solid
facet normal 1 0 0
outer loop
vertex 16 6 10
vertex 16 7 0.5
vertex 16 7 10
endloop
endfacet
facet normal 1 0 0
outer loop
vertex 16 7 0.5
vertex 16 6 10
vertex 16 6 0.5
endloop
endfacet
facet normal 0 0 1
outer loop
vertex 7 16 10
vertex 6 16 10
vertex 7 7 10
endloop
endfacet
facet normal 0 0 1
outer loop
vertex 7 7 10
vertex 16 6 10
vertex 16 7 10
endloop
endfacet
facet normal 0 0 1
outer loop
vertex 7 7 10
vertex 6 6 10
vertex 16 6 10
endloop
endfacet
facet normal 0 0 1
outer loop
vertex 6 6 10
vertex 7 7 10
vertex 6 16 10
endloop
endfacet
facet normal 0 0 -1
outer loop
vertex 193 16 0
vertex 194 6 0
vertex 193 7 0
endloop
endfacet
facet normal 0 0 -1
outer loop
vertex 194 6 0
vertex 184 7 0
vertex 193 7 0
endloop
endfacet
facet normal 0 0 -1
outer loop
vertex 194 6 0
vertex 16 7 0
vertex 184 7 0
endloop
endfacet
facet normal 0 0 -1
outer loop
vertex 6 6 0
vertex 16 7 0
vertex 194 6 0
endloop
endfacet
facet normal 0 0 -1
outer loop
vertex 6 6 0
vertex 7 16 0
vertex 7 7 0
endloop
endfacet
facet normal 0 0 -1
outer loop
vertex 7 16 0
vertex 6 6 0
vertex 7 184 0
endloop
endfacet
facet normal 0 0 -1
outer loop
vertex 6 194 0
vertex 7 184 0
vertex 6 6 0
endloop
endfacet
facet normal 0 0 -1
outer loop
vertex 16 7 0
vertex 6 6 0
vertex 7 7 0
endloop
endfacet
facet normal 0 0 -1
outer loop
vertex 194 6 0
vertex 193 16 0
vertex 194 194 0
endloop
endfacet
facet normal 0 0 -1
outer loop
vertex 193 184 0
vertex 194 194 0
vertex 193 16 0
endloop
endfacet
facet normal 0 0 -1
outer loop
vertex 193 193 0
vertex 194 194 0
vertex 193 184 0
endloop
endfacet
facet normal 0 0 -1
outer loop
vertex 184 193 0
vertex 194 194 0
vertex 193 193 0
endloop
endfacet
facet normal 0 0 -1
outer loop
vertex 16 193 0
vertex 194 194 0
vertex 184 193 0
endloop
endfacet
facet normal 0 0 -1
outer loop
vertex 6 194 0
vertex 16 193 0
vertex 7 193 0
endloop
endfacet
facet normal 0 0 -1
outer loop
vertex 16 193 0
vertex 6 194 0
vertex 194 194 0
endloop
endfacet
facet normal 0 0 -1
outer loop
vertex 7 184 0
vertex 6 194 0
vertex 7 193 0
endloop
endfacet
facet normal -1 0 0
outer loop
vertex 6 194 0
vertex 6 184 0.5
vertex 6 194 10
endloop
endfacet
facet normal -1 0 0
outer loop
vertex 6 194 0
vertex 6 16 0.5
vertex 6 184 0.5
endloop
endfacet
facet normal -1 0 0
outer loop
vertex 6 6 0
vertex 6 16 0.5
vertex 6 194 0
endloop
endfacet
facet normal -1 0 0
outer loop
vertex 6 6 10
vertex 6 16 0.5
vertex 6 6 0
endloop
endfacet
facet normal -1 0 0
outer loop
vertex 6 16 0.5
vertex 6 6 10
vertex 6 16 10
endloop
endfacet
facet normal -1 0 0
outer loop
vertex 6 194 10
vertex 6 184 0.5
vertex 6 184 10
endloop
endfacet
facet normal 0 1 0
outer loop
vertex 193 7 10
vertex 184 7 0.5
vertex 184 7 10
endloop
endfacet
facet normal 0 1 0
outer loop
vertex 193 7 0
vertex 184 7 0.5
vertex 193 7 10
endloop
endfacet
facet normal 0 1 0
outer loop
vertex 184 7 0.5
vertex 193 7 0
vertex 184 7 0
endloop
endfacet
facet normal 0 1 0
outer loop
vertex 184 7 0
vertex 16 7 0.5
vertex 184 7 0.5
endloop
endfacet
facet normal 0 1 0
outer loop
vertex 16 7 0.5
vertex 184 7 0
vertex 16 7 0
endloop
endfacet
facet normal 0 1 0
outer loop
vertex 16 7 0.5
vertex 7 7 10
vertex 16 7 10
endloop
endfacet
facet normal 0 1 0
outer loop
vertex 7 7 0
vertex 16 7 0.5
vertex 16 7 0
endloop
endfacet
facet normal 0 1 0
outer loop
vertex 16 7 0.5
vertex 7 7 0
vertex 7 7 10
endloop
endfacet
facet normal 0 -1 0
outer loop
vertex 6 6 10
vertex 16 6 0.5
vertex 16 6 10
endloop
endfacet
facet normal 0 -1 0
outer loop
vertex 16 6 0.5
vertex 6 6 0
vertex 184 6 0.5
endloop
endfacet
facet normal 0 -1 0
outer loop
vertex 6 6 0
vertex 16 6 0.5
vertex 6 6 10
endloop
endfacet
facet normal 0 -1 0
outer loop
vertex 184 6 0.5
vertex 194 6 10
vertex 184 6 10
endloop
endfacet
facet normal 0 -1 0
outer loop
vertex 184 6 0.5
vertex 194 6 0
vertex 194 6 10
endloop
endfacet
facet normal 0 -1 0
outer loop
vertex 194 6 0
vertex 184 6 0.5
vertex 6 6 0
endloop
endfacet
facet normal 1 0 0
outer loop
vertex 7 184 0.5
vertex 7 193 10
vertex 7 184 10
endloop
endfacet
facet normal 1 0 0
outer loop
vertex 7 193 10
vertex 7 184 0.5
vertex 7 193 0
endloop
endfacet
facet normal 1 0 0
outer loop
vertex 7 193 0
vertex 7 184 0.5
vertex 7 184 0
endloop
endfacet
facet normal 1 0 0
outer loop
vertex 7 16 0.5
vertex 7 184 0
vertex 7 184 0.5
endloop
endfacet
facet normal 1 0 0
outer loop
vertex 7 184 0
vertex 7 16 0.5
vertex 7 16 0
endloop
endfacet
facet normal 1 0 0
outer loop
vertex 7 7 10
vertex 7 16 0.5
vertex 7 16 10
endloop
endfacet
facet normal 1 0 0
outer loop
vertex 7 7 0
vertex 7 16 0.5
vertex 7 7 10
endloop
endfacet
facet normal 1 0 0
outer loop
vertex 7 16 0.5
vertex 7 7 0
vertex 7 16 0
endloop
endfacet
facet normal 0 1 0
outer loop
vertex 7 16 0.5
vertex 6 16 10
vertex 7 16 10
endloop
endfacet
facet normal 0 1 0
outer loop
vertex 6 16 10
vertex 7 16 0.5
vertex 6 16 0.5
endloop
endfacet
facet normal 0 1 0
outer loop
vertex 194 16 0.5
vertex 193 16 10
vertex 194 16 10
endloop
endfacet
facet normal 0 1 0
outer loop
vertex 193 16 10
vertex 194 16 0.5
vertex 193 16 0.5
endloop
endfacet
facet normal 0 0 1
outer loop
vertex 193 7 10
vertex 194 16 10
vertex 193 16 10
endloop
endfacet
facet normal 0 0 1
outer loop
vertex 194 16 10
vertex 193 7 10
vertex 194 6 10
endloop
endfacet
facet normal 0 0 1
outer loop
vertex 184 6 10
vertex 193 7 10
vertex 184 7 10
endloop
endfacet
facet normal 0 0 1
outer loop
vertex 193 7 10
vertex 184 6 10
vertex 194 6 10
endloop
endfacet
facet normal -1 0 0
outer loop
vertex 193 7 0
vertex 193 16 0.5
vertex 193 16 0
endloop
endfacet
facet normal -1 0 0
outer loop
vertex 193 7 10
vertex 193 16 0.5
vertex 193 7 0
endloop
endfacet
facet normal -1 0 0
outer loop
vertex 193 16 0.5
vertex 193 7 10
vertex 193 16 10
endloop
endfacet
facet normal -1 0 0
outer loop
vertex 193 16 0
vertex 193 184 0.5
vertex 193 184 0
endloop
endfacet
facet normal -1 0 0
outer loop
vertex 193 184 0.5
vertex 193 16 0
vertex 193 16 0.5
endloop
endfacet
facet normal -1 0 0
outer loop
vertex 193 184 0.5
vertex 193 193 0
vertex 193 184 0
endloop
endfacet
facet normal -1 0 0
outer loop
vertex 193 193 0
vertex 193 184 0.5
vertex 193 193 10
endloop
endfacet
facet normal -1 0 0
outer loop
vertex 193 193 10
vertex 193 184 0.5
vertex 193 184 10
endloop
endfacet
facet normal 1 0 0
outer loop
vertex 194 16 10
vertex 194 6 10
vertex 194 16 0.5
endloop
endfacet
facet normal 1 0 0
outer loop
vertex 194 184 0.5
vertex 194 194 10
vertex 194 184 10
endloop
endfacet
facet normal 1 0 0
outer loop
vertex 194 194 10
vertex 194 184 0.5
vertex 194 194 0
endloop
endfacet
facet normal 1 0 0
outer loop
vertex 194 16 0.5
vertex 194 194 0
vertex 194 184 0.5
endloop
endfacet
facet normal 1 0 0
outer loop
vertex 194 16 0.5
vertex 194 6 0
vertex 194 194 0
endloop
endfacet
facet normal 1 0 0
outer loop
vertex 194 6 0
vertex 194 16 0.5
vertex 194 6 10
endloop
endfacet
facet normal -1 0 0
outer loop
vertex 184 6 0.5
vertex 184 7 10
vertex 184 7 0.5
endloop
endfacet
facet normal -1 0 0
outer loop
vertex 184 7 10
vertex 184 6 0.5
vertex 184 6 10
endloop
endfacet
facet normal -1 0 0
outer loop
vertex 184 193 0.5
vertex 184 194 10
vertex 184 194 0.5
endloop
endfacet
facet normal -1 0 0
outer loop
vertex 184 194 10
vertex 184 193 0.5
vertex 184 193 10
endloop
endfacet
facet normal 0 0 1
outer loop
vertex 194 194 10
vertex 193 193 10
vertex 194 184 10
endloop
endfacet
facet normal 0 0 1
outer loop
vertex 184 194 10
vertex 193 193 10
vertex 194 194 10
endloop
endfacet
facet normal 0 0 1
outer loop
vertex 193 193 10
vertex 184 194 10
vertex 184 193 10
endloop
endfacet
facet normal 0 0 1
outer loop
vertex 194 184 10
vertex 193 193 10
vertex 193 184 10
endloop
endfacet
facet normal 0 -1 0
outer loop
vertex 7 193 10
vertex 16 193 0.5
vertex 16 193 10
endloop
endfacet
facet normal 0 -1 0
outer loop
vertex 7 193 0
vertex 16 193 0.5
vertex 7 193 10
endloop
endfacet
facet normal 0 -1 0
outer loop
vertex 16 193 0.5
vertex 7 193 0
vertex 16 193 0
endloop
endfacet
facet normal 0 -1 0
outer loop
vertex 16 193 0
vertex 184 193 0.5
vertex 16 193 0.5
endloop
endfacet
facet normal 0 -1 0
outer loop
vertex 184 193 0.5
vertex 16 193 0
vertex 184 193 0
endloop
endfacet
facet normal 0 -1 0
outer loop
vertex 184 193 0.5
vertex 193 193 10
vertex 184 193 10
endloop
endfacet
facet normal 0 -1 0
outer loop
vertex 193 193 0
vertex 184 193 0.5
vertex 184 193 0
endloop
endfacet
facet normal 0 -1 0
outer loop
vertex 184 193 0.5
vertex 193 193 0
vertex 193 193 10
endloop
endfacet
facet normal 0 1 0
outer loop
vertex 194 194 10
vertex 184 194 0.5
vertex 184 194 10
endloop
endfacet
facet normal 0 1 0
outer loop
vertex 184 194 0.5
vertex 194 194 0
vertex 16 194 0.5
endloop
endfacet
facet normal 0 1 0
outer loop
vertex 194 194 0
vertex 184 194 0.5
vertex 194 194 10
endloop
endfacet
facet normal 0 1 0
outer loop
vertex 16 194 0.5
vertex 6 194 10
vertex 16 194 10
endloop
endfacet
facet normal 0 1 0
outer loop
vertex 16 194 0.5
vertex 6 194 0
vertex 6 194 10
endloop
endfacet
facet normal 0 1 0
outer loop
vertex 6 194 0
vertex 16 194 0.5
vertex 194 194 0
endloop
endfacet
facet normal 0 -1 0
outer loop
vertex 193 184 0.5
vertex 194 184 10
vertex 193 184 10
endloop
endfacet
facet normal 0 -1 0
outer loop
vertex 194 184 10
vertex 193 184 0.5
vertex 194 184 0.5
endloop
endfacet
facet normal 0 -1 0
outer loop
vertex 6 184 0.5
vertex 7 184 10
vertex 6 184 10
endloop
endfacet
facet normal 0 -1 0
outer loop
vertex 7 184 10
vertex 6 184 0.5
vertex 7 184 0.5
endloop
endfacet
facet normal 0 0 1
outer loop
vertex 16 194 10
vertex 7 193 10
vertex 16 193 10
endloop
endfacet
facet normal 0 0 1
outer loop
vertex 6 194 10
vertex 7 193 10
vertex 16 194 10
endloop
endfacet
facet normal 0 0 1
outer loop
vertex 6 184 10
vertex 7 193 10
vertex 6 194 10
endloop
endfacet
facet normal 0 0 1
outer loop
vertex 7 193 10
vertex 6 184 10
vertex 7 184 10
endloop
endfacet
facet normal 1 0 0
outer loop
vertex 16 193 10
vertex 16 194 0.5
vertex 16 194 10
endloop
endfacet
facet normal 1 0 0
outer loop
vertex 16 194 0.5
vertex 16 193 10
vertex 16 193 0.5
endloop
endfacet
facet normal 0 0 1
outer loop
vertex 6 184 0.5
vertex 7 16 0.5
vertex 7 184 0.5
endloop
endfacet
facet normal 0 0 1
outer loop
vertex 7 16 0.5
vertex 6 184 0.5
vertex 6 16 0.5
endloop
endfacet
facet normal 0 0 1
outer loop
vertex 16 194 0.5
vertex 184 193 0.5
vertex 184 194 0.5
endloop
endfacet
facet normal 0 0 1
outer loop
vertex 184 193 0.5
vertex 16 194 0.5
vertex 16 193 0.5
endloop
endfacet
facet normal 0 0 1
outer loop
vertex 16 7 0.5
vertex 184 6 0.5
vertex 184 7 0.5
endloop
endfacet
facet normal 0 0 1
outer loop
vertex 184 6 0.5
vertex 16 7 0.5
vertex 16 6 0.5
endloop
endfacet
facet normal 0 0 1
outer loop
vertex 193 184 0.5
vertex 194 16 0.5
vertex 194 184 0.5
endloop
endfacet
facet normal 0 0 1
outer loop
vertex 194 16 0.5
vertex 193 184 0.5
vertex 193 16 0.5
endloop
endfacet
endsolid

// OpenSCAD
// Kinematic Calibration print-in-place calibration fixture
// Usfeul for measuring the motion of the bed using a portable CMM

BedX = 200;
BedY = 200;
OuterClearence = 6; // space left outside each side for skirts, brims, etc.

CornerHeight = 10;
CornerLength = 10;
CornerThickness = 1;


ConnectionHeight = .5; // set to 0 to remove
ConnectionThickness = 1;


%cube([BedX, BedY, 0.1]); // preview print bed area

union()
{
	translate([OuterClearence, OuterClearence, 0]) corner(); // Is it necessary to do this translation? Of course not, it just makes more sense when reading the code.
	
	translate([ BedX - OuterClearence, OuterClearence, 0]) rotate([0,0,90]) corner();
	
	translate([ BedX - OuterClearence, + BedY - OuterClearence, 0]) rotate([0,0,180]) corner();
	
	translate([ OuterClearence, BedY - OuterClearence, 0]) rotate([0,0,270]) corner();
	
	// Connecting Rim to help hold the corners in place
	difference()
	{
		translate([OuterClearence, OuterClearence, 0]) cube([BedX - OuterClearence - OuterClearence, BedY - OuterClearence - OuterClearence, ConnectionHeight]);
	
		translate([OuterClearence + ConnectionThickness, OuterClearence + ConnectionThickness, 0]) cube([BedX - OuterClearence - OuterClearence - ConnectionThickness - ConnectionThickness, BedY - OuterClearence - OuterClearence - ConnectionThickness - ConnectionThickness, ConnectionHeight]);
	}
}


module corner()
{
	union()
	{
		cube([CornerLength, CornerThickness, CornerHeight]);
		cube([CornerThickness, CornerLength, CornerHeight]);
	}
}
